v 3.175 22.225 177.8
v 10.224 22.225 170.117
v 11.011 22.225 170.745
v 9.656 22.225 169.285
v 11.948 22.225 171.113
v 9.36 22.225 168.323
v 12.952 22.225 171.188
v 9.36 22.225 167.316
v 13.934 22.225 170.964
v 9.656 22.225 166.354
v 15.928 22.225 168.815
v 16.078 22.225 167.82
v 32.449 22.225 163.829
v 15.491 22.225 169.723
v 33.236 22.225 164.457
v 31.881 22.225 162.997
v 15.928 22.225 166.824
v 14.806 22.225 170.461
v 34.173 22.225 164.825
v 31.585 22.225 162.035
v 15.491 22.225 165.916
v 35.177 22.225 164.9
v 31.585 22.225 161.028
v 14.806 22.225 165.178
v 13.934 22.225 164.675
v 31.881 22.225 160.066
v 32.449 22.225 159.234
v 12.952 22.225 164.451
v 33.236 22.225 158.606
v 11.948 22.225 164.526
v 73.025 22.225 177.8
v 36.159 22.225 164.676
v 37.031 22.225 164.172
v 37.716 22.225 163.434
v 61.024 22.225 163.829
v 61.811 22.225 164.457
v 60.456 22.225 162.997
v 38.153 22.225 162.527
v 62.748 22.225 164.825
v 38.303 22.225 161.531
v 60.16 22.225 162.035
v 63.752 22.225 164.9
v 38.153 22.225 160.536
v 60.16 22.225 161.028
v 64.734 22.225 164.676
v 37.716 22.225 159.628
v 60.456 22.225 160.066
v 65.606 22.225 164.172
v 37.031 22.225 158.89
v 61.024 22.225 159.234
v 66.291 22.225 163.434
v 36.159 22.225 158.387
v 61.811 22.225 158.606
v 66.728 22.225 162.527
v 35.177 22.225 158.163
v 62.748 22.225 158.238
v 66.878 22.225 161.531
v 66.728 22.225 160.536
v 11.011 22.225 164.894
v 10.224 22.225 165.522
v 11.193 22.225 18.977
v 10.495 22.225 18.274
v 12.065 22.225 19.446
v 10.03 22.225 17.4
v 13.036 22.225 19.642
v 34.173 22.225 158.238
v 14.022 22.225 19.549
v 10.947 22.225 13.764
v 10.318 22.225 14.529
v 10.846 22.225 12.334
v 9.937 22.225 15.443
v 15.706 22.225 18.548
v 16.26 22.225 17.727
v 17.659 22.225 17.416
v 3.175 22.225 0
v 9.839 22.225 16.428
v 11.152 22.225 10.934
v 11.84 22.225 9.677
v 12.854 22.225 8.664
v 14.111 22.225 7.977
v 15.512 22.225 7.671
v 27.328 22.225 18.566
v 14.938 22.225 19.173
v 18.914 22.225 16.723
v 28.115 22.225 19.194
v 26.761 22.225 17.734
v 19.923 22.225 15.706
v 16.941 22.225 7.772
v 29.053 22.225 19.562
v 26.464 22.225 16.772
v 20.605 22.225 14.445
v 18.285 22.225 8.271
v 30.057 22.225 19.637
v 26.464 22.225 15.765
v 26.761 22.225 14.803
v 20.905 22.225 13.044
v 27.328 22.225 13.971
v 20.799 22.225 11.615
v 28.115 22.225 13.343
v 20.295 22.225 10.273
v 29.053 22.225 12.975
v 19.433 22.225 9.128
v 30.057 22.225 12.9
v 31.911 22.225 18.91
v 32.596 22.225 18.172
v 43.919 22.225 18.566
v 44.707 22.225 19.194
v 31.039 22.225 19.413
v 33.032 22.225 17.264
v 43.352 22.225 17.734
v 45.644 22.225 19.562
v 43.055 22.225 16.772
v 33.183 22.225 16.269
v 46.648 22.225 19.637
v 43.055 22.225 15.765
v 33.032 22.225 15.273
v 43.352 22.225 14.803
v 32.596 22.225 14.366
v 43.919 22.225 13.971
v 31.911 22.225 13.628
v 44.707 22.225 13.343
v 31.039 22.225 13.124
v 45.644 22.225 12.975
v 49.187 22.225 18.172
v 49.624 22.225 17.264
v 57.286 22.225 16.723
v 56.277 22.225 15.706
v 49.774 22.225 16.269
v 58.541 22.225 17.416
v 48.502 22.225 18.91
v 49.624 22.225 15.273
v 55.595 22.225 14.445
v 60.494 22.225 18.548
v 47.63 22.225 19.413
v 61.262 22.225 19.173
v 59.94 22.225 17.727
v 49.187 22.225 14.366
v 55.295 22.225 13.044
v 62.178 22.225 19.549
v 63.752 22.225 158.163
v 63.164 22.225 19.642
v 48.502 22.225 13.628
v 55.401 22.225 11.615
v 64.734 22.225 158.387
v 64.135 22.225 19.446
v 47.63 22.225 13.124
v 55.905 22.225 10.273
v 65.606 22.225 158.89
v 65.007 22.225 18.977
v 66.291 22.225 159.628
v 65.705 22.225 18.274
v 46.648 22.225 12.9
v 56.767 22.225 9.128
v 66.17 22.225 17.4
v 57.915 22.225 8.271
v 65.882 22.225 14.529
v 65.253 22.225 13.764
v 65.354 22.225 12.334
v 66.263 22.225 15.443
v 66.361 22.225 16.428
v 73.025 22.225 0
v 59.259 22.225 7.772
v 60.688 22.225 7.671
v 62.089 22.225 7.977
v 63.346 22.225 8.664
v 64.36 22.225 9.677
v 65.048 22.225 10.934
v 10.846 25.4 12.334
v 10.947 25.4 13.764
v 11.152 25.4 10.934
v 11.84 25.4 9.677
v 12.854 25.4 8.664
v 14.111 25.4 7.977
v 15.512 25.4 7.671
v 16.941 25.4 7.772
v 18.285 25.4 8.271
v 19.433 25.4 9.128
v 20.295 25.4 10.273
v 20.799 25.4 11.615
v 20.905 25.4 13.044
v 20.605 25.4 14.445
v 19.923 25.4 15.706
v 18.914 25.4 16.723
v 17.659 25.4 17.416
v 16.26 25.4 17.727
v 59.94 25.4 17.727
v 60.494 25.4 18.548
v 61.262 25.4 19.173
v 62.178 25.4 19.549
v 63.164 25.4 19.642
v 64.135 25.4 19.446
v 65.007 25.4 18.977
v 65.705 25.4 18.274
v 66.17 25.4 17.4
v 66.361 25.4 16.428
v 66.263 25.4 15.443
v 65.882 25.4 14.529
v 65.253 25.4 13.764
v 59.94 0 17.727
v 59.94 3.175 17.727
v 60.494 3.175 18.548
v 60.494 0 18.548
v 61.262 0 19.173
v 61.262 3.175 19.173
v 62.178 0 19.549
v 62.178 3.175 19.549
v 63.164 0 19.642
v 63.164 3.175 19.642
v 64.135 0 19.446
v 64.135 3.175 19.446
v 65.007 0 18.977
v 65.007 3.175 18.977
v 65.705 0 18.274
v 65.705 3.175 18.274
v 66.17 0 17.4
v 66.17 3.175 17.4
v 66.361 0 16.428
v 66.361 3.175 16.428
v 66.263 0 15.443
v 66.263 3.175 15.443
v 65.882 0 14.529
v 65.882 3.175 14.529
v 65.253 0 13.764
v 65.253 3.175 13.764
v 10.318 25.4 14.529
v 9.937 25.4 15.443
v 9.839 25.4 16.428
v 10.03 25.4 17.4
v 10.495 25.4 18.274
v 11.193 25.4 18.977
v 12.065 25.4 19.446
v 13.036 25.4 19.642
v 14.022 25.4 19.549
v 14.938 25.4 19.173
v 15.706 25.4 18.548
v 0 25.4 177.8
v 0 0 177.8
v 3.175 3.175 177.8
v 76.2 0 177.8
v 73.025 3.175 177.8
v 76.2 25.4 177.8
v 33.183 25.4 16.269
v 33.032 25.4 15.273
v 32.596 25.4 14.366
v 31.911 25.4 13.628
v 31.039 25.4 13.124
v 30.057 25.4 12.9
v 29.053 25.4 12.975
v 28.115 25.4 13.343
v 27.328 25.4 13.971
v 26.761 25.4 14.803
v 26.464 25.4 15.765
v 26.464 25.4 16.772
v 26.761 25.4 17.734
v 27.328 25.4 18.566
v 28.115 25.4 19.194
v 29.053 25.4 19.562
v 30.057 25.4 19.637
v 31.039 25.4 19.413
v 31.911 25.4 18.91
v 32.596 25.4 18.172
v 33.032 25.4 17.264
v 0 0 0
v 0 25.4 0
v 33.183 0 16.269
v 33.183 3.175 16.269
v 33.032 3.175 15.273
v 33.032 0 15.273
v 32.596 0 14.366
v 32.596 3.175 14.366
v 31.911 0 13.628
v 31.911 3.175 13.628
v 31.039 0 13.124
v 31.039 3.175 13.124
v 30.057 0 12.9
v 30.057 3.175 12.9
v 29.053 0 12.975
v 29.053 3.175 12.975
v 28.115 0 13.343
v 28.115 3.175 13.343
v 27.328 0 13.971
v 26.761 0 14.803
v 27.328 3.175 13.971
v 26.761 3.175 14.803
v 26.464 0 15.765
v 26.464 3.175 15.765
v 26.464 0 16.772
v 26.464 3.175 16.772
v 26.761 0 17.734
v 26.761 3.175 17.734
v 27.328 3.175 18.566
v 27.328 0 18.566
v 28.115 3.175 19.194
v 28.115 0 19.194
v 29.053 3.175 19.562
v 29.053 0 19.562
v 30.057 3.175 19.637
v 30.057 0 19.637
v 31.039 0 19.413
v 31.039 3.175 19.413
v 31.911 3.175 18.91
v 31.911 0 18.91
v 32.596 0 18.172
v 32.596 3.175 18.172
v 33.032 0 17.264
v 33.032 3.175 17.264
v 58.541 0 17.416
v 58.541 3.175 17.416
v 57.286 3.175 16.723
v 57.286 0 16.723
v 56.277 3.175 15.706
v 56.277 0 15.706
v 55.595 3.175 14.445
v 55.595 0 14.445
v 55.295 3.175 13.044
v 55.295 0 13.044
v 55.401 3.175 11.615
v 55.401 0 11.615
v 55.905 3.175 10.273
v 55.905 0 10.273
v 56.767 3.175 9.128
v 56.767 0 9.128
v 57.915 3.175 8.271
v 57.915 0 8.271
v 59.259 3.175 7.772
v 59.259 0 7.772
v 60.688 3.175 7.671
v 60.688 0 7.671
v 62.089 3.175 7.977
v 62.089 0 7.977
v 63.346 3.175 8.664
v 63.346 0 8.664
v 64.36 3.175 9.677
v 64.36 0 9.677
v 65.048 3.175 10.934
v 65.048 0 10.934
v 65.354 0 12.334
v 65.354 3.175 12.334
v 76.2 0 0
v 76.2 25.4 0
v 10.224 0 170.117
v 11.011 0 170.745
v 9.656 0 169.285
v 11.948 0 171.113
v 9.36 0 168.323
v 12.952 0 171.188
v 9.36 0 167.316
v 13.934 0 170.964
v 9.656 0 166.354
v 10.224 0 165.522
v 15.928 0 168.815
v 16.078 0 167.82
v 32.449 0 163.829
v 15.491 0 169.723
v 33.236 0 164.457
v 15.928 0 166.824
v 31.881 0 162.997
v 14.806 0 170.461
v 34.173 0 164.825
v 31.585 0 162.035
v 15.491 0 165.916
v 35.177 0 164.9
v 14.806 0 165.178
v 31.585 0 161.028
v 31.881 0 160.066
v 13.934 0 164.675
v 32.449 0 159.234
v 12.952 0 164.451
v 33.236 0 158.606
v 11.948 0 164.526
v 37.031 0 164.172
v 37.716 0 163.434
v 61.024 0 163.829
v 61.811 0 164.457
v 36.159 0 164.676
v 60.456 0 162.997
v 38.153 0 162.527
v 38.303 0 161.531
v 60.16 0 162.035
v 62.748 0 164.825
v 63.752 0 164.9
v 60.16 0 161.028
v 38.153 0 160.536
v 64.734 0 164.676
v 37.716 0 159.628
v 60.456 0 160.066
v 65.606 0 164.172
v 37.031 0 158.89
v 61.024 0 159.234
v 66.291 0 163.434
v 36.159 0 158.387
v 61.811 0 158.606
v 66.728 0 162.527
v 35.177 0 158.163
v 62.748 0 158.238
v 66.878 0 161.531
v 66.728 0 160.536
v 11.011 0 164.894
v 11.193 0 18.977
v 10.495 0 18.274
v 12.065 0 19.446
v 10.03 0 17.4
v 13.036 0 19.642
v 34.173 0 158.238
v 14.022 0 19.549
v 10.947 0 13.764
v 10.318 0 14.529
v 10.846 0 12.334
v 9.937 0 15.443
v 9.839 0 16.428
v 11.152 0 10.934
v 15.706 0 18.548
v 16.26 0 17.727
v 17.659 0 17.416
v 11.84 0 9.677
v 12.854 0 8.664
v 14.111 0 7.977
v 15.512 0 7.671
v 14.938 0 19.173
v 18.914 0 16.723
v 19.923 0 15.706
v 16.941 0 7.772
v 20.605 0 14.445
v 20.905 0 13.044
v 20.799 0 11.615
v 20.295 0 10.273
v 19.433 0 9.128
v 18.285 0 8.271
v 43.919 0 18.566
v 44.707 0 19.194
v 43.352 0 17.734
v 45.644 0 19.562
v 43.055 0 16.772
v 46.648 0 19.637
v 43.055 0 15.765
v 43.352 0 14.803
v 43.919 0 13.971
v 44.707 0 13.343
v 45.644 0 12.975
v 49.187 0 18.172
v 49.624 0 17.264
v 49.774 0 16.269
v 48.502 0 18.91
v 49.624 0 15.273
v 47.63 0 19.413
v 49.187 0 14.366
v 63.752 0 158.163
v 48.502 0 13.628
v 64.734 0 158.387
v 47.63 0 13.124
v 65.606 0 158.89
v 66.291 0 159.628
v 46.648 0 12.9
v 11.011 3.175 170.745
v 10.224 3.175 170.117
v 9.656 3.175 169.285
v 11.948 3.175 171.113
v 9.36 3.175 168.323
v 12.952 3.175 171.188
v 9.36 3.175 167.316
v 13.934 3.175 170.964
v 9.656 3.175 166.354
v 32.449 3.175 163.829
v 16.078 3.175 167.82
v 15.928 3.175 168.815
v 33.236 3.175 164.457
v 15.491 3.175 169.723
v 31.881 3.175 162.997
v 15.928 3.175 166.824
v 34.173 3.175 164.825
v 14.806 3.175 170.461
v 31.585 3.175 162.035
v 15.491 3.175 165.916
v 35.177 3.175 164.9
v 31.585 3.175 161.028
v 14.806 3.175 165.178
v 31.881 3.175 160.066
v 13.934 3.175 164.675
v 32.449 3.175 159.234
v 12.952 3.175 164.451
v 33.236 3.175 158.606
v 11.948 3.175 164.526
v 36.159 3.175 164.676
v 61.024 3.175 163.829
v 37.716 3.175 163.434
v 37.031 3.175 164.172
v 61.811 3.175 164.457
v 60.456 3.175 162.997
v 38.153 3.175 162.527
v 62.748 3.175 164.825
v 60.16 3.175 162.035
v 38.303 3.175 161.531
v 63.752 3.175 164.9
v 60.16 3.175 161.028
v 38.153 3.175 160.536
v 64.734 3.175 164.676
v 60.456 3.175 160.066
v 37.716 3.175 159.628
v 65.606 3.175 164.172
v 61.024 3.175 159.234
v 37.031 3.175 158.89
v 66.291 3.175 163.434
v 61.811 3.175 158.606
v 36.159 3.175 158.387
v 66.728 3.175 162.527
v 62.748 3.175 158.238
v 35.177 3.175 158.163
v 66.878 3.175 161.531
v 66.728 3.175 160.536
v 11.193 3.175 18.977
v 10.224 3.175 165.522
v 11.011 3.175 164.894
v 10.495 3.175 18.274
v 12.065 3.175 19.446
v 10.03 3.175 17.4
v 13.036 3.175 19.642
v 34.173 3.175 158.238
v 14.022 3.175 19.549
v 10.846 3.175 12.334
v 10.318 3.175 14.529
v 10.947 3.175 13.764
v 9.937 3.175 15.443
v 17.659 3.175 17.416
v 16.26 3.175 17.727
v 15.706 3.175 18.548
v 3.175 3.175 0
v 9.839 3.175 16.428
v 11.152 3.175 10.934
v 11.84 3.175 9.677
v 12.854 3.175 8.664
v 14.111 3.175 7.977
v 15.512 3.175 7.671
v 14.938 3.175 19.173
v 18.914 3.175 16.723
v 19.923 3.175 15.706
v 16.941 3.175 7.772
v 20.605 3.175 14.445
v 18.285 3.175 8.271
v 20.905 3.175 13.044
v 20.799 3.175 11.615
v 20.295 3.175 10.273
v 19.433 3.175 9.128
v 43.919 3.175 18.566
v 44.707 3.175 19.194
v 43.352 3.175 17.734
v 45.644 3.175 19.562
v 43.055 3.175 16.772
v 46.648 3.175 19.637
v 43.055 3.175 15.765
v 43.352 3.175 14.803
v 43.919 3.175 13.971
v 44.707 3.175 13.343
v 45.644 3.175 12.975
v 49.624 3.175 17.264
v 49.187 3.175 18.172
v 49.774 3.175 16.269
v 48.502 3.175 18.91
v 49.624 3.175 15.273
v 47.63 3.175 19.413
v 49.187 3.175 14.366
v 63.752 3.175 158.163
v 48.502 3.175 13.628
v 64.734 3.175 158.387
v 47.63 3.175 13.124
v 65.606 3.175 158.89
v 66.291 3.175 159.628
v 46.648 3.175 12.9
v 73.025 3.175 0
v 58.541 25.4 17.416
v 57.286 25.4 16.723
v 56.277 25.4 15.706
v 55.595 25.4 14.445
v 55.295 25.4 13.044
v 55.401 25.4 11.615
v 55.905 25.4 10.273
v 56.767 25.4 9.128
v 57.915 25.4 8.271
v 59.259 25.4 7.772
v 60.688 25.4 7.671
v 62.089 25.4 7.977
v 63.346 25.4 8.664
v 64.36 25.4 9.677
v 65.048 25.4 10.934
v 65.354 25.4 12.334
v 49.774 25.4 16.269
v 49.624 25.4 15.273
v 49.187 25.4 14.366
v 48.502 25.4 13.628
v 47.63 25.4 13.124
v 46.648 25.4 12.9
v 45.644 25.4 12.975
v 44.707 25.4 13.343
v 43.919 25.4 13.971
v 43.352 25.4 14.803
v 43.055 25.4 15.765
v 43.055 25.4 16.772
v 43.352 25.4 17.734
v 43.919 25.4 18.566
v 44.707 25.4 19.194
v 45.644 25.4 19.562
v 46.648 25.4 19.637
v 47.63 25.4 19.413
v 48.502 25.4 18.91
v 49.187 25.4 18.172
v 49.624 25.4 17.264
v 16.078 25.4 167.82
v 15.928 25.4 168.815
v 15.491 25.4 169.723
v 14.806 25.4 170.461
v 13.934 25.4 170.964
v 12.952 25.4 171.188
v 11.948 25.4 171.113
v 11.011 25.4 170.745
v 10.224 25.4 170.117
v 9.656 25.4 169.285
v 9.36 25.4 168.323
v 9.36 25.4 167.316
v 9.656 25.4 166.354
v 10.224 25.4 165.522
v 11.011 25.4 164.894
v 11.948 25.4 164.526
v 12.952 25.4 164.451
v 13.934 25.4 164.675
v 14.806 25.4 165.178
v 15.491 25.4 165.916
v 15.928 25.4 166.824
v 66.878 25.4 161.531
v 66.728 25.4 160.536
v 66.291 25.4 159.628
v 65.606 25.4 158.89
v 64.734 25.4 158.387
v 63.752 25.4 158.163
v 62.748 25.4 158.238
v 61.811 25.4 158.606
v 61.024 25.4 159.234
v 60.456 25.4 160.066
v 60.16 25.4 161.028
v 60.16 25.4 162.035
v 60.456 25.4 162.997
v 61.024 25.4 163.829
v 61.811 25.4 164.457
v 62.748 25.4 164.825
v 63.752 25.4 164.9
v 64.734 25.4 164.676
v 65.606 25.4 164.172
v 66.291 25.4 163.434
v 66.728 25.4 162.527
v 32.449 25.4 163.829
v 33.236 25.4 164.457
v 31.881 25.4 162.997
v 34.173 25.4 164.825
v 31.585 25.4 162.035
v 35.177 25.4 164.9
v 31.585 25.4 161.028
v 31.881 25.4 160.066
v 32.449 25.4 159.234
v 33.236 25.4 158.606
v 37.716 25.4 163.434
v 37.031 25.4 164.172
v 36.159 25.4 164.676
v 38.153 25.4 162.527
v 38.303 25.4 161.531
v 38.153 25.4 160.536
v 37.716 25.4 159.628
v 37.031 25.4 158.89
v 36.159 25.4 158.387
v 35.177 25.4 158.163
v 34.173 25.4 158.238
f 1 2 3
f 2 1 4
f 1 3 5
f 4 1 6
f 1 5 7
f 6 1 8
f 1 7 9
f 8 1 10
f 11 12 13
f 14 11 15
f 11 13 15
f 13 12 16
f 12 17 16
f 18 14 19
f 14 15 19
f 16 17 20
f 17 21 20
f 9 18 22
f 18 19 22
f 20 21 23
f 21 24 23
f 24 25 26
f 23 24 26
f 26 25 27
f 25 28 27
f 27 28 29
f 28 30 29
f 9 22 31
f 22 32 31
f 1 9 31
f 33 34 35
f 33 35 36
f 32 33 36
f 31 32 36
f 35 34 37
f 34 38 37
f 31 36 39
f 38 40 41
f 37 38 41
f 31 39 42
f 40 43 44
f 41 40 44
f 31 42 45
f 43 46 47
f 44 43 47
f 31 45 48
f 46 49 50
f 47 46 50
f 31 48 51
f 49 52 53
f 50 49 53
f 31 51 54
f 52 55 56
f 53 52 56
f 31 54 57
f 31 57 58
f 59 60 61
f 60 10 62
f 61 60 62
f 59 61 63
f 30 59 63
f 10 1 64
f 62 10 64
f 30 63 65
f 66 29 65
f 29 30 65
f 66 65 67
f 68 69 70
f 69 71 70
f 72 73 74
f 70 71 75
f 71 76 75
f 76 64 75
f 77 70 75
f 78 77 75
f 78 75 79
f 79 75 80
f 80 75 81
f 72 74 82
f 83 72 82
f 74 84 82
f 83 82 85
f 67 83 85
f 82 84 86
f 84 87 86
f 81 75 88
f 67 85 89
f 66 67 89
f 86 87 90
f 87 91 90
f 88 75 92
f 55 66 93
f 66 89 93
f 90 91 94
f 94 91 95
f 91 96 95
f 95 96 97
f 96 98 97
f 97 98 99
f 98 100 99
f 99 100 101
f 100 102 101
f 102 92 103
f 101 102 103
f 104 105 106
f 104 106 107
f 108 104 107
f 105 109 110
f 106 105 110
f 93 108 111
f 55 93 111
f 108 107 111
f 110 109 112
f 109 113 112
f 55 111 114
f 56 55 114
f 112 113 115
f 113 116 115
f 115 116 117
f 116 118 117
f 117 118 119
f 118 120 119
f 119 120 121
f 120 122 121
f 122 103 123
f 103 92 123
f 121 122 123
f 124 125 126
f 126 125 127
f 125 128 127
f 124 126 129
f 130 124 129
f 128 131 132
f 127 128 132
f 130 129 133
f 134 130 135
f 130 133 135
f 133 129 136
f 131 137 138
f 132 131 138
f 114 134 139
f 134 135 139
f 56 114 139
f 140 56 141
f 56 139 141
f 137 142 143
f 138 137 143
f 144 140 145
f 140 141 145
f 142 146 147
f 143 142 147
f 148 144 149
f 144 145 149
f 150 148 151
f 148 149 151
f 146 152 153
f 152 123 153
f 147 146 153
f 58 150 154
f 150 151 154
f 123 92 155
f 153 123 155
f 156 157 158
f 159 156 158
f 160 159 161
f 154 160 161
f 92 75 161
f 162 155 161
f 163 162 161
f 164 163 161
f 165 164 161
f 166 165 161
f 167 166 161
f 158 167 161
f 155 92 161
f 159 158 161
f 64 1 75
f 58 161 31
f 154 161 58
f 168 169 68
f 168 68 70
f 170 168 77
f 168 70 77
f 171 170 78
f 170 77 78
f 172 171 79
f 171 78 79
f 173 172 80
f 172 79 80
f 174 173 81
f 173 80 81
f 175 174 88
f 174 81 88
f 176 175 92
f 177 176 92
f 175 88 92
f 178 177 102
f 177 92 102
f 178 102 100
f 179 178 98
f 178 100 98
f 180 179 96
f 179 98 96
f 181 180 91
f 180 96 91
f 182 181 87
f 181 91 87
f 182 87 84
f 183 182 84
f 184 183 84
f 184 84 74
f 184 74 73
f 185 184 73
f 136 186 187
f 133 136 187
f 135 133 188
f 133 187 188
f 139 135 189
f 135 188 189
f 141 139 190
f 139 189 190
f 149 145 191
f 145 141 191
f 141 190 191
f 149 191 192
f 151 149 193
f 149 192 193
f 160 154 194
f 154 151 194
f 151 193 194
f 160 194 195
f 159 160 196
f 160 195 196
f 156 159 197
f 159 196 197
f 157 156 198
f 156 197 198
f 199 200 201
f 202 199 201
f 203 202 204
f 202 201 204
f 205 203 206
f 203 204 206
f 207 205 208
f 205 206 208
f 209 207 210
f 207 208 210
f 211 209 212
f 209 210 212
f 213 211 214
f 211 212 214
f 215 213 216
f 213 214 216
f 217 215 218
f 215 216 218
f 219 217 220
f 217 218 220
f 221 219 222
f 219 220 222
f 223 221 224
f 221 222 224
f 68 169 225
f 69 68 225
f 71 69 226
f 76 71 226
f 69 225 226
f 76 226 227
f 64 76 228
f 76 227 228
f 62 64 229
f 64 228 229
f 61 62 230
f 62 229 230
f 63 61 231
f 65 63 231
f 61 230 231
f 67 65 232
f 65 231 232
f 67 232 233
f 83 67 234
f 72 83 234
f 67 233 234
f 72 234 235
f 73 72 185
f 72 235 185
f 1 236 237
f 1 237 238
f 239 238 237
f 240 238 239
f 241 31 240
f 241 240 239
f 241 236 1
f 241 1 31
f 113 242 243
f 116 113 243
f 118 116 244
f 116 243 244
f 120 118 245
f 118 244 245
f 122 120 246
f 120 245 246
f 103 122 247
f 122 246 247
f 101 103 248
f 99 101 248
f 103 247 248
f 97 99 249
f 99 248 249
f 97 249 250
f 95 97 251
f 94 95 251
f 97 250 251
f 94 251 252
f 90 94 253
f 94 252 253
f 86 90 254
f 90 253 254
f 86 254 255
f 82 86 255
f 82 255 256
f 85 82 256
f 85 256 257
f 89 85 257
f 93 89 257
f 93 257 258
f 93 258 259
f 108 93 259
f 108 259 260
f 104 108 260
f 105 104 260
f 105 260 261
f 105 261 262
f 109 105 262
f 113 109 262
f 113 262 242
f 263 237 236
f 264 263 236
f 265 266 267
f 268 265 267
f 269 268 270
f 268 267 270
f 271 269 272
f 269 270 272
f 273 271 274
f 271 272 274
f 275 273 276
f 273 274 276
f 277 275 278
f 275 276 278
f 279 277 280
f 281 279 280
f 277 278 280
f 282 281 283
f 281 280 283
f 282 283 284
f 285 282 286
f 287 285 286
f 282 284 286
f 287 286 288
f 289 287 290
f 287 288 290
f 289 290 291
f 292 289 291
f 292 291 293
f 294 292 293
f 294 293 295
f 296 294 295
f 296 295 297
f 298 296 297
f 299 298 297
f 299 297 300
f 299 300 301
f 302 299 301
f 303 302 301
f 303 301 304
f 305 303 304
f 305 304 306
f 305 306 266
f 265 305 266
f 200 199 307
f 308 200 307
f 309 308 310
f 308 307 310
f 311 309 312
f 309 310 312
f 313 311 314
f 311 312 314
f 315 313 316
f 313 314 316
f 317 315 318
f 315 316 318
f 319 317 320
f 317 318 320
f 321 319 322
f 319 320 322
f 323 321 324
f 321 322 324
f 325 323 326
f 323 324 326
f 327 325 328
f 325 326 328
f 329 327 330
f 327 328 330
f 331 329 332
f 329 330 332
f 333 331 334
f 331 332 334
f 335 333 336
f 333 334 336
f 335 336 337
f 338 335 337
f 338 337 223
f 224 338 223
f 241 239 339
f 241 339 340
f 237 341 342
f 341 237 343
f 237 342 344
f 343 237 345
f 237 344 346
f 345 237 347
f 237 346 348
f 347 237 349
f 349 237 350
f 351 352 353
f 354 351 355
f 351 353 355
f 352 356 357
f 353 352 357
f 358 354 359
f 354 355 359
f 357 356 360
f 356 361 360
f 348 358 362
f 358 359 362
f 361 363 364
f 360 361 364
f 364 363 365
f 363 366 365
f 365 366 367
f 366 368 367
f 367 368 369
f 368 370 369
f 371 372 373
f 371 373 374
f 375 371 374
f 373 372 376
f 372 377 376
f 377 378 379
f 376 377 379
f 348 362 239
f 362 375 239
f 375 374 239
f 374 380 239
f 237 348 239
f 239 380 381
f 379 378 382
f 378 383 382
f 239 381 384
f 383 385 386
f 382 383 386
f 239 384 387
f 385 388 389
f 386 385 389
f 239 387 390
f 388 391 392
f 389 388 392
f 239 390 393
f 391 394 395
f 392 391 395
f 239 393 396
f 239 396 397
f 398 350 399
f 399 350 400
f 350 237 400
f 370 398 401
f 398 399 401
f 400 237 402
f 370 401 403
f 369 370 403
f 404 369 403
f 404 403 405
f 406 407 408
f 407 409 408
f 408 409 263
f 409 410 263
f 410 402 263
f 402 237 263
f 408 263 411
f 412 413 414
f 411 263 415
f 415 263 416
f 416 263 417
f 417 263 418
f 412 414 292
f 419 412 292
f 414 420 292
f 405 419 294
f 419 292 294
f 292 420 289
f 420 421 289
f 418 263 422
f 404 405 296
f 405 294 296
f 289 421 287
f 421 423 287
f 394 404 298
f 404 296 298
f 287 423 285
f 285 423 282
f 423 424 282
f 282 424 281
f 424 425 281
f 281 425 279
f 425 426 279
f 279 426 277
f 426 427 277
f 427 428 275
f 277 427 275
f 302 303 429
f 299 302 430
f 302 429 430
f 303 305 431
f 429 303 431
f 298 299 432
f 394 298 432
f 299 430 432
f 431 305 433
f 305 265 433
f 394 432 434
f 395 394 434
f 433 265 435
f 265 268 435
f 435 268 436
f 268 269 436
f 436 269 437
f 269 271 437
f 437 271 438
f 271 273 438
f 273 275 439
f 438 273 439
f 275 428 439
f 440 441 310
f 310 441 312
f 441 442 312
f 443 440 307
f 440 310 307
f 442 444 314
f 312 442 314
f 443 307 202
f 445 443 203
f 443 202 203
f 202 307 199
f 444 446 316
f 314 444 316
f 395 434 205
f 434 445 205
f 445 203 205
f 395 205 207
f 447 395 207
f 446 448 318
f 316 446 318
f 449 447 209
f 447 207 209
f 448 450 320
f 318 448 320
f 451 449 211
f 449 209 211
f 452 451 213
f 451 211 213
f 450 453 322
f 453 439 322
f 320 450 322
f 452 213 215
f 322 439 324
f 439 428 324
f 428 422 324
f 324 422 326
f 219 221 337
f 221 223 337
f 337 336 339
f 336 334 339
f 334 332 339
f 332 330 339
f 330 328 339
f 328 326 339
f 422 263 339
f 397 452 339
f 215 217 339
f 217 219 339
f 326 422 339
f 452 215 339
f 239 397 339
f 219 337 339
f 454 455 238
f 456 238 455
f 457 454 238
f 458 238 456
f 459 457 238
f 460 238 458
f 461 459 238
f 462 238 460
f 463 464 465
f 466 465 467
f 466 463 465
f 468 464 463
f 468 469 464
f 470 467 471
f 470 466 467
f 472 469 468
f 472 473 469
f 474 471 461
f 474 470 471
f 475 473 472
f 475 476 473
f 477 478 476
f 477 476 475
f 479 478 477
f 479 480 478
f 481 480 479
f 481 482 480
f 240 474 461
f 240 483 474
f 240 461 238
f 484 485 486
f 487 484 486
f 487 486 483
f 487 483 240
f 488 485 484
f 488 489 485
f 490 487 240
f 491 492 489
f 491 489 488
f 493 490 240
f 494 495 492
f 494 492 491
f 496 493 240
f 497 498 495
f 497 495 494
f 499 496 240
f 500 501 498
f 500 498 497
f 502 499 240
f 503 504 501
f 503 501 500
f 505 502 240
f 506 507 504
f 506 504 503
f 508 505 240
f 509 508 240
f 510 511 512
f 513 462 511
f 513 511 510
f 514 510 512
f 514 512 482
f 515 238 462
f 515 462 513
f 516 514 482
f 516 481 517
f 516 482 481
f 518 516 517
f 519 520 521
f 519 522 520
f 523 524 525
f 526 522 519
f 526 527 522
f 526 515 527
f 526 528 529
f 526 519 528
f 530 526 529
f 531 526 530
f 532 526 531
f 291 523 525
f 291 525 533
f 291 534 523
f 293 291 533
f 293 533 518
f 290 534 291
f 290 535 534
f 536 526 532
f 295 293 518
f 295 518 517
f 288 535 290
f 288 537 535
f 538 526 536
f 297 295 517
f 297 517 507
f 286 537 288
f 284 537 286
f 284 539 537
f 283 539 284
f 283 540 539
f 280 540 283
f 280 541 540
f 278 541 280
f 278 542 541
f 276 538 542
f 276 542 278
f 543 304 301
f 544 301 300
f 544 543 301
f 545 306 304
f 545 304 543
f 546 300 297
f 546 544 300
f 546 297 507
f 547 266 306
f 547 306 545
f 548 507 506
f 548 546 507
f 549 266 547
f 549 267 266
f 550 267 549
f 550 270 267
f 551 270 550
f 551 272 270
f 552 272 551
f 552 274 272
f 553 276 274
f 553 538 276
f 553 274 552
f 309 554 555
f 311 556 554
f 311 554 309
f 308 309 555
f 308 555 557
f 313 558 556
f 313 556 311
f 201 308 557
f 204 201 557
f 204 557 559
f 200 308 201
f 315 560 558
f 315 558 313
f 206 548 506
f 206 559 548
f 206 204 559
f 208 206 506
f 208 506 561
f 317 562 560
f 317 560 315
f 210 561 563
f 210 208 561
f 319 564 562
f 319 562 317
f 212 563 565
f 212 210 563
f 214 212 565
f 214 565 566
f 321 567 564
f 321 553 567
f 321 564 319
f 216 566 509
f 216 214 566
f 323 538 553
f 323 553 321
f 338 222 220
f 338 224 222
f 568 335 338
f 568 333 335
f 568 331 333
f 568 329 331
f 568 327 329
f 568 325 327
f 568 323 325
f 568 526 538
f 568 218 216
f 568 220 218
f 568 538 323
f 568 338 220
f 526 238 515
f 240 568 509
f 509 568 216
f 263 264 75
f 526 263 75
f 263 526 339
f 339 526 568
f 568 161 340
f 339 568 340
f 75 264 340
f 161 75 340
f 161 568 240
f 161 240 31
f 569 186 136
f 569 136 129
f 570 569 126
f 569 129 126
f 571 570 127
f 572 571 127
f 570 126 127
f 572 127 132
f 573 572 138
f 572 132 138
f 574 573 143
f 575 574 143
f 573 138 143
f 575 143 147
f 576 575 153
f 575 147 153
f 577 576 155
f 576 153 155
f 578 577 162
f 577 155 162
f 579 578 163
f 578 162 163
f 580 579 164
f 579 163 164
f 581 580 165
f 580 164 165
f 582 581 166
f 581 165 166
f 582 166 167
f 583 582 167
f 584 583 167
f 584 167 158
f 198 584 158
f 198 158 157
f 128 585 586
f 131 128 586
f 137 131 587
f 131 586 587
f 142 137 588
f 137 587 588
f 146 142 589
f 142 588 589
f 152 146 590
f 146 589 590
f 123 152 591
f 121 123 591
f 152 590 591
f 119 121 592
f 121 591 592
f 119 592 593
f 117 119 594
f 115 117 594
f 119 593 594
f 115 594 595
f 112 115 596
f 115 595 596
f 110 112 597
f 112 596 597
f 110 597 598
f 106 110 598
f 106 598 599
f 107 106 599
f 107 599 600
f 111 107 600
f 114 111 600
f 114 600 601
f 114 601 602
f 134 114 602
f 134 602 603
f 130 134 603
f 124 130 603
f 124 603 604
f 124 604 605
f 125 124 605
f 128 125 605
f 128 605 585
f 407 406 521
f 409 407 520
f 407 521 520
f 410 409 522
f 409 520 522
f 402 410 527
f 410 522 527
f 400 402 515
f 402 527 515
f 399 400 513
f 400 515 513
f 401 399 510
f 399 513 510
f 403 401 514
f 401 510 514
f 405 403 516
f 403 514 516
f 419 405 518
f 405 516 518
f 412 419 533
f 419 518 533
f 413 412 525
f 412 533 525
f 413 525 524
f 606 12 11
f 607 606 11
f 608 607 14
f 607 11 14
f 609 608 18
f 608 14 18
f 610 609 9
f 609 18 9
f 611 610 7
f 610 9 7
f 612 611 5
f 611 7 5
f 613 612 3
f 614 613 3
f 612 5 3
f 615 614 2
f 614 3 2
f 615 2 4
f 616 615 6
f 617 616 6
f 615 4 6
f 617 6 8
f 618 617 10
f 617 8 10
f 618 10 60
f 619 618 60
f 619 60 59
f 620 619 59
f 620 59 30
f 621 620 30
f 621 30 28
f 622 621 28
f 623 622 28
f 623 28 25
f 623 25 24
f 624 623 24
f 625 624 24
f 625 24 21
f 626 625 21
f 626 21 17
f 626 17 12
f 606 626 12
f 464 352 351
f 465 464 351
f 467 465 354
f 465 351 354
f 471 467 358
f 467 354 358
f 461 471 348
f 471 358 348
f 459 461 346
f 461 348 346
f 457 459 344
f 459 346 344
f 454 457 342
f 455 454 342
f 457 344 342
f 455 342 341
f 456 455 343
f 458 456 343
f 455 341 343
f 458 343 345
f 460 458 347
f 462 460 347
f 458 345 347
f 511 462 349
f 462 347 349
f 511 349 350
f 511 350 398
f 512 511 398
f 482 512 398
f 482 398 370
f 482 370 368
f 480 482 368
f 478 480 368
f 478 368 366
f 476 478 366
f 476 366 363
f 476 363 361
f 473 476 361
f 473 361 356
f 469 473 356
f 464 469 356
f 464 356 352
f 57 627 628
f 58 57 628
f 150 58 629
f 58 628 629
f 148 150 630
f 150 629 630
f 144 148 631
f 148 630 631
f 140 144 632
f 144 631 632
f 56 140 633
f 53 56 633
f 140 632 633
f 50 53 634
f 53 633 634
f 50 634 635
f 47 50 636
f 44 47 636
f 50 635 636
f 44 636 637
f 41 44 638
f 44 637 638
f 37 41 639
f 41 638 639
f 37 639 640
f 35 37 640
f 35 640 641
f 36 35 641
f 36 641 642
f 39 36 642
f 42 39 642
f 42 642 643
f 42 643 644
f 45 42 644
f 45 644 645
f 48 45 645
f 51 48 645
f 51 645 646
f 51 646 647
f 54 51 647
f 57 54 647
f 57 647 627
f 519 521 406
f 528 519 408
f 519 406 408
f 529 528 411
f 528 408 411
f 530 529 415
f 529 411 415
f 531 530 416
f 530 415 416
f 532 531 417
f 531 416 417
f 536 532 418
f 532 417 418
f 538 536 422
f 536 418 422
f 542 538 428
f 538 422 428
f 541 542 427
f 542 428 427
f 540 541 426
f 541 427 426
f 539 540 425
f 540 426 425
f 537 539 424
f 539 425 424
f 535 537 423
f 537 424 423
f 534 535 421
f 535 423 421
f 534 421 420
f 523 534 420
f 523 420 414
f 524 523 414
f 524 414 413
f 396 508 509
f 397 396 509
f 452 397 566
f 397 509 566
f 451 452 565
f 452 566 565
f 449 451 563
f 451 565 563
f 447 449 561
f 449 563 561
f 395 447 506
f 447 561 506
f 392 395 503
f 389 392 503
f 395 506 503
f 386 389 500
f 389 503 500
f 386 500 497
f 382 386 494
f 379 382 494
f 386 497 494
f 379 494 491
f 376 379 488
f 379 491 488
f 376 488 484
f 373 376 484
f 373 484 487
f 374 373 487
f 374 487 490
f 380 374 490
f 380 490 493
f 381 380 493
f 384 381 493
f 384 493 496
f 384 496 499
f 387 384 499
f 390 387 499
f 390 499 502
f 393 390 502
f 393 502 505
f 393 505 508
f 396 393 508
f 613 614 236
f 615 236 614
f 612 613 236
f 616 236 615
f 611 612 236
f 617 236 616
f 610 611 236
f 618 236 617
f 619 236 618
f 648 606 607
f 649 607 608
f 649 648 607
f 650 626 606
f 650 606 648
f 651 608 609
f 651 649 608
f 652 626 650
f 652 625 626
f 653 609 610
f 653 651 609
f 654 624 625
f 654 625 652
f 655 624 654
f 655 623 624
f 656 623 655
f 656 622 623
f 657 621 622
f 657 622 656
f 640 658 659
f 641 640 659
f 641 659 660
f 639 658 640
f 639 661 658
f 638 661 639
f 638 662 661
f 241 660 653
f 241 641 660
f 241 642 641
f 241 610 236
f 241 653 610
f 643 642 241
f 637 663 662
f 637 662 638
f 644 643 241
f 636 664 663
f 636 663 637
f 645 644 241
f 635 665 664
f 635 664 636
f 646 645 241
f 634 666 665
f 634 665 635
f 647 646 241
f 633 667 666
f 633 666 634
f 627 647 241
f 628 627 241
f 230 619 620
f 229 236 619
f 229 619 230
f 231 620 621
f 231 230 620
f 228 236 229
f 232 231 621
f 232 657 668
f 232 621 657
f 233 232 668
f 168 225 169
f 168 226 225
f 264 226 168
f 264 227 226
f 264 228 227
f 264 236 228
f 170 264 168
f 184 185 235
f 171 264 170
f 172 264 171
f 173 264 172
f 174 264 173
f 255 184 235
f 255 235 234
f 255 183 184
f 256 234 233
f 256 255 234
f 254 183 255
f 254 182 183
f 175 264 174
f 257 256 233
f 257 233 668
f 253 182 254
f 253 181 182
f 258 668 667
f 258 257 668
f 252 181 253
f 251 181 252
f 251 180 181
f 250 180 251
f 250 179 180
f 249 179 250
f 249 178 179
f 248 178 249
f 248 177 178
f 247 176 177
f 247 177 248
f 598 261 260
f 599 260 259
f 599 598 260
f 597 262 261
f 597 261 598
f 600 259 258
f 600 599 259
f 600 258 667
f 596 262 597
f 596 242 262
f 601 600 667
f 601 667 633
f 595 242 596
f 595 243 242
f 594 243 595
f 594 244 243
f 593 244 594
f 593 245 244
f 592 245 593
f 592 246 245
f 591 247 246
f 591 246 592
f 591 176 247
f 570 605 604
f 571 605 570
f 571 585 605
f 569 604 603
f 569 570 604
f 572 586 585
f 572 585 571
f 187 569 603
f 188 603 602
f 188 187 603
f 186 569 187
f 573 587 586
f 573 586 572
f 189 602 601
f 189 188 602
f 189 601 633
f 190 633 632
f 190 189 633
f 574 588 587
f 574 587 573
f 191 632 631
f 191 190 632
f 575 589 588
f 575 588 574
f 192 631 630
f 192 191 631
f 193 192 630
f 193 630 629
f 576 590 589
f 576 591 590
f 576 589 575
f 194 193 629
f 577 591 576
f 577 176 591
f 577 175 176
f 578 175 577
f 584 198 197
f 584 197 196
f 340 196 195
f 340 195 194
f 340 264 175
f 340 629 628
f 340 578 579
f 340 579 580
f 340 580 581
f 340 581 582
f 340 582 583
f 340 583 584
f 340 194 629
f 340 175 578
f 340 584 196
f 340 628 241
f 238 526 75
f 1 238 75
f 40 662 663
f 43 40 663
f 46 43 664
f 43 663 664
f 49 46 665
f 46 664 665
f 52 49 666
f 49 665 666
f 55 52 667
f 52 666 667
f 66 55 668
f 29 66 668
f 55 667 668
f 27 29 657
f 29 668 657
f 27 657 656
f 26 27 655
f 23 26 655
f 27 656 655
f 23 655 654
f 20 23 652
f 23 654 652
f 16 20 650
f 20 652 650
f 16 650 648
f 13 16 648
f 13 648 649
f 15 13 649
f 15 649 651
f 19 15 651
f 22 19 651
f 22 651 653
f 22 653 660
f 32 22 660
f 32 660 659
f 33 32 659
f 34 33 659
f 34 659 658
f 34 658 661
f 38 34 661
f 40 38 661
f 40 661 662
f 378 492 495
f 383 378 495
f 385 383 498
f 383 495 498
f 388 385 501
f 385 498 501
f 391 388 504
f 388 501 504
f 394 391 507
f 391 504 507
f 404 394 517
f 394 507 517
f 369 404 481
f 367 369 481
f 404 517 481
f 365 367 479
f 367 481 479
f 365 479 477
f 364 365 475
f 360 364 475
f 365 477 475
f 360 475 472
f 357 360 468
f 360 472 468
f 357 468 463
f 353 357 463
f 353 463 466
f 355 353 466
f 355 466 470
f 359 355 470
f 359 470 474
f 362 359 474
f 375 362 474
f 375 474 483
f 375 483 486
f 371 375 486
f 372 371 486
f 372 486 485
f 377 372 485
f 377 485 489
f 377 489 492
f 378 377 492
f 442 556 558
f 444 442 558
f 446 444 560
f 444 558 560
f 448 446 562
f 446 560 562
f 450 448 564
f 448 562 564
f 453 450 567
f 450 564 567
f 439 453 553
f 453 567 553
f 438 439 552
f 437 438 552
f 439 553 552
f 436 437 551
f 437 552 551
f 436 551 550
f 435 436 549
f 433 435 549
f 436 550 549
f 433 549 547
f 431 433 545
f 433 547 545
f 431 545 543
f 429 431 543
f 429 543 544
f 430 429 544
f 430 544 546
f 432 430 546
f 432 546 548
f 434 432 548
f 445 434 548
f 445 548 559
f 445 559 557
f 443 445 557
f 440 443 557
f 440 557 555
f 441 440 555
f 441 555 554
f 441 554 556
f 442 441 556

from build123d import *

# Parameters (mm, degrees)
SKETCH1_W           = 76.2
SKETCH1_H           = 25.4
SKETCH1_W_2         = 69.85
SKETCH1_H_2         = 19.05
BOSS_EXTRUDE1_DEPTH = 177.8
SKETCH4_R           = 3.3782
CUT_EXTRUDE1_DEPTH  = 26.4
SKETCH5_R           = 3.3782
CUT_EXTRUDE2_DEPTH  = 26.4
SKETCH6_R           = 3.3782
CUT_EXTRUDE3_DEPTH  = 26.4
SKETCH7_R           = 5.0419
CUT_EXTRUDE4_DEPTH  = 26.4


with BuildPart() as part:
    # Sketch1 → Boss-Extrude1 (new body)
    with BuildSketch(Plane.XY):
        with Locations((38.1, 12.7)):
            Rectangle(SKETCH1_W, SKETCH1_H)
        with Locations((38.1, 12.7)):
            Rectangle(SKETCH1_W_2, SKETCH1_H_2, mode=Mode.SUBTRACT)
    extrude(amount=BOSS_EXTRUDE1_DEPTH)

    # Sketch4 → Cut-Extrude1 (cut, through all)
    with BuildSketch(Plane(origin=(0, 25.4, 0), x_dir=(1, 0, 0), z_dir=(0, 1, 0))):
        with Locations((13.21308, -16.2687)):
            Circle(SKETCH4_R)
        with Locations((29.80436, -16.2687)):
            Circle(SKETCH4_R)
        with Locations((46.39564, -16.2687)):
            Circle(SKETCH4_R)
        with Locations((62.98692, -16.2687)):
            Circle(SKETCH4_R)
    extrude(amount=-CUT_EXTRUDE1_DEPTH, mode=Mode.SUBTRACT)

    # Sketch5 → Cut-Extrude2 (cut, through all)
    with BuildSketch(Plane.XZ):
        with Locations((12.7, 167.819500474)):
            Circle(SKETCH5_R)
    extrude(amount=-CUT_EXTRUDE2_DEPTH, mode=Mode.SUBTRACT)

    # Sketch6 → Cut-Extrude3 (cut, through all)
    with BuildSketch(Plane(origin=(0, 25.4, 0), x_dir=(1, 0, 0), z_dir=(0, 1, 0))):
        with Locations((63.5, -161.5313)):
            Circle(SKETCH6_R)
        with Locations((34.925, -161.5313)):
            Circle(SKETCH6_R)
    extrude(amount=-CUT_EXTRUDE3_DEPTH, mode=Mode.SUBTRACT)

    # Sketch7 → Cut-Extrude4 (cut, through all)
    with BuildSketch(Plane.XZ):
        with Locations((15.875, 12.7)):
            Circle(SKETCH7_R)
        with Locations((60.325, 12.7)):
            Circle(SKETCH7_R)
    extrude(amount=-CUT_EXTRUDE4_DEPTH, mode=Mode.SUBTRACT)


solid = part.part
